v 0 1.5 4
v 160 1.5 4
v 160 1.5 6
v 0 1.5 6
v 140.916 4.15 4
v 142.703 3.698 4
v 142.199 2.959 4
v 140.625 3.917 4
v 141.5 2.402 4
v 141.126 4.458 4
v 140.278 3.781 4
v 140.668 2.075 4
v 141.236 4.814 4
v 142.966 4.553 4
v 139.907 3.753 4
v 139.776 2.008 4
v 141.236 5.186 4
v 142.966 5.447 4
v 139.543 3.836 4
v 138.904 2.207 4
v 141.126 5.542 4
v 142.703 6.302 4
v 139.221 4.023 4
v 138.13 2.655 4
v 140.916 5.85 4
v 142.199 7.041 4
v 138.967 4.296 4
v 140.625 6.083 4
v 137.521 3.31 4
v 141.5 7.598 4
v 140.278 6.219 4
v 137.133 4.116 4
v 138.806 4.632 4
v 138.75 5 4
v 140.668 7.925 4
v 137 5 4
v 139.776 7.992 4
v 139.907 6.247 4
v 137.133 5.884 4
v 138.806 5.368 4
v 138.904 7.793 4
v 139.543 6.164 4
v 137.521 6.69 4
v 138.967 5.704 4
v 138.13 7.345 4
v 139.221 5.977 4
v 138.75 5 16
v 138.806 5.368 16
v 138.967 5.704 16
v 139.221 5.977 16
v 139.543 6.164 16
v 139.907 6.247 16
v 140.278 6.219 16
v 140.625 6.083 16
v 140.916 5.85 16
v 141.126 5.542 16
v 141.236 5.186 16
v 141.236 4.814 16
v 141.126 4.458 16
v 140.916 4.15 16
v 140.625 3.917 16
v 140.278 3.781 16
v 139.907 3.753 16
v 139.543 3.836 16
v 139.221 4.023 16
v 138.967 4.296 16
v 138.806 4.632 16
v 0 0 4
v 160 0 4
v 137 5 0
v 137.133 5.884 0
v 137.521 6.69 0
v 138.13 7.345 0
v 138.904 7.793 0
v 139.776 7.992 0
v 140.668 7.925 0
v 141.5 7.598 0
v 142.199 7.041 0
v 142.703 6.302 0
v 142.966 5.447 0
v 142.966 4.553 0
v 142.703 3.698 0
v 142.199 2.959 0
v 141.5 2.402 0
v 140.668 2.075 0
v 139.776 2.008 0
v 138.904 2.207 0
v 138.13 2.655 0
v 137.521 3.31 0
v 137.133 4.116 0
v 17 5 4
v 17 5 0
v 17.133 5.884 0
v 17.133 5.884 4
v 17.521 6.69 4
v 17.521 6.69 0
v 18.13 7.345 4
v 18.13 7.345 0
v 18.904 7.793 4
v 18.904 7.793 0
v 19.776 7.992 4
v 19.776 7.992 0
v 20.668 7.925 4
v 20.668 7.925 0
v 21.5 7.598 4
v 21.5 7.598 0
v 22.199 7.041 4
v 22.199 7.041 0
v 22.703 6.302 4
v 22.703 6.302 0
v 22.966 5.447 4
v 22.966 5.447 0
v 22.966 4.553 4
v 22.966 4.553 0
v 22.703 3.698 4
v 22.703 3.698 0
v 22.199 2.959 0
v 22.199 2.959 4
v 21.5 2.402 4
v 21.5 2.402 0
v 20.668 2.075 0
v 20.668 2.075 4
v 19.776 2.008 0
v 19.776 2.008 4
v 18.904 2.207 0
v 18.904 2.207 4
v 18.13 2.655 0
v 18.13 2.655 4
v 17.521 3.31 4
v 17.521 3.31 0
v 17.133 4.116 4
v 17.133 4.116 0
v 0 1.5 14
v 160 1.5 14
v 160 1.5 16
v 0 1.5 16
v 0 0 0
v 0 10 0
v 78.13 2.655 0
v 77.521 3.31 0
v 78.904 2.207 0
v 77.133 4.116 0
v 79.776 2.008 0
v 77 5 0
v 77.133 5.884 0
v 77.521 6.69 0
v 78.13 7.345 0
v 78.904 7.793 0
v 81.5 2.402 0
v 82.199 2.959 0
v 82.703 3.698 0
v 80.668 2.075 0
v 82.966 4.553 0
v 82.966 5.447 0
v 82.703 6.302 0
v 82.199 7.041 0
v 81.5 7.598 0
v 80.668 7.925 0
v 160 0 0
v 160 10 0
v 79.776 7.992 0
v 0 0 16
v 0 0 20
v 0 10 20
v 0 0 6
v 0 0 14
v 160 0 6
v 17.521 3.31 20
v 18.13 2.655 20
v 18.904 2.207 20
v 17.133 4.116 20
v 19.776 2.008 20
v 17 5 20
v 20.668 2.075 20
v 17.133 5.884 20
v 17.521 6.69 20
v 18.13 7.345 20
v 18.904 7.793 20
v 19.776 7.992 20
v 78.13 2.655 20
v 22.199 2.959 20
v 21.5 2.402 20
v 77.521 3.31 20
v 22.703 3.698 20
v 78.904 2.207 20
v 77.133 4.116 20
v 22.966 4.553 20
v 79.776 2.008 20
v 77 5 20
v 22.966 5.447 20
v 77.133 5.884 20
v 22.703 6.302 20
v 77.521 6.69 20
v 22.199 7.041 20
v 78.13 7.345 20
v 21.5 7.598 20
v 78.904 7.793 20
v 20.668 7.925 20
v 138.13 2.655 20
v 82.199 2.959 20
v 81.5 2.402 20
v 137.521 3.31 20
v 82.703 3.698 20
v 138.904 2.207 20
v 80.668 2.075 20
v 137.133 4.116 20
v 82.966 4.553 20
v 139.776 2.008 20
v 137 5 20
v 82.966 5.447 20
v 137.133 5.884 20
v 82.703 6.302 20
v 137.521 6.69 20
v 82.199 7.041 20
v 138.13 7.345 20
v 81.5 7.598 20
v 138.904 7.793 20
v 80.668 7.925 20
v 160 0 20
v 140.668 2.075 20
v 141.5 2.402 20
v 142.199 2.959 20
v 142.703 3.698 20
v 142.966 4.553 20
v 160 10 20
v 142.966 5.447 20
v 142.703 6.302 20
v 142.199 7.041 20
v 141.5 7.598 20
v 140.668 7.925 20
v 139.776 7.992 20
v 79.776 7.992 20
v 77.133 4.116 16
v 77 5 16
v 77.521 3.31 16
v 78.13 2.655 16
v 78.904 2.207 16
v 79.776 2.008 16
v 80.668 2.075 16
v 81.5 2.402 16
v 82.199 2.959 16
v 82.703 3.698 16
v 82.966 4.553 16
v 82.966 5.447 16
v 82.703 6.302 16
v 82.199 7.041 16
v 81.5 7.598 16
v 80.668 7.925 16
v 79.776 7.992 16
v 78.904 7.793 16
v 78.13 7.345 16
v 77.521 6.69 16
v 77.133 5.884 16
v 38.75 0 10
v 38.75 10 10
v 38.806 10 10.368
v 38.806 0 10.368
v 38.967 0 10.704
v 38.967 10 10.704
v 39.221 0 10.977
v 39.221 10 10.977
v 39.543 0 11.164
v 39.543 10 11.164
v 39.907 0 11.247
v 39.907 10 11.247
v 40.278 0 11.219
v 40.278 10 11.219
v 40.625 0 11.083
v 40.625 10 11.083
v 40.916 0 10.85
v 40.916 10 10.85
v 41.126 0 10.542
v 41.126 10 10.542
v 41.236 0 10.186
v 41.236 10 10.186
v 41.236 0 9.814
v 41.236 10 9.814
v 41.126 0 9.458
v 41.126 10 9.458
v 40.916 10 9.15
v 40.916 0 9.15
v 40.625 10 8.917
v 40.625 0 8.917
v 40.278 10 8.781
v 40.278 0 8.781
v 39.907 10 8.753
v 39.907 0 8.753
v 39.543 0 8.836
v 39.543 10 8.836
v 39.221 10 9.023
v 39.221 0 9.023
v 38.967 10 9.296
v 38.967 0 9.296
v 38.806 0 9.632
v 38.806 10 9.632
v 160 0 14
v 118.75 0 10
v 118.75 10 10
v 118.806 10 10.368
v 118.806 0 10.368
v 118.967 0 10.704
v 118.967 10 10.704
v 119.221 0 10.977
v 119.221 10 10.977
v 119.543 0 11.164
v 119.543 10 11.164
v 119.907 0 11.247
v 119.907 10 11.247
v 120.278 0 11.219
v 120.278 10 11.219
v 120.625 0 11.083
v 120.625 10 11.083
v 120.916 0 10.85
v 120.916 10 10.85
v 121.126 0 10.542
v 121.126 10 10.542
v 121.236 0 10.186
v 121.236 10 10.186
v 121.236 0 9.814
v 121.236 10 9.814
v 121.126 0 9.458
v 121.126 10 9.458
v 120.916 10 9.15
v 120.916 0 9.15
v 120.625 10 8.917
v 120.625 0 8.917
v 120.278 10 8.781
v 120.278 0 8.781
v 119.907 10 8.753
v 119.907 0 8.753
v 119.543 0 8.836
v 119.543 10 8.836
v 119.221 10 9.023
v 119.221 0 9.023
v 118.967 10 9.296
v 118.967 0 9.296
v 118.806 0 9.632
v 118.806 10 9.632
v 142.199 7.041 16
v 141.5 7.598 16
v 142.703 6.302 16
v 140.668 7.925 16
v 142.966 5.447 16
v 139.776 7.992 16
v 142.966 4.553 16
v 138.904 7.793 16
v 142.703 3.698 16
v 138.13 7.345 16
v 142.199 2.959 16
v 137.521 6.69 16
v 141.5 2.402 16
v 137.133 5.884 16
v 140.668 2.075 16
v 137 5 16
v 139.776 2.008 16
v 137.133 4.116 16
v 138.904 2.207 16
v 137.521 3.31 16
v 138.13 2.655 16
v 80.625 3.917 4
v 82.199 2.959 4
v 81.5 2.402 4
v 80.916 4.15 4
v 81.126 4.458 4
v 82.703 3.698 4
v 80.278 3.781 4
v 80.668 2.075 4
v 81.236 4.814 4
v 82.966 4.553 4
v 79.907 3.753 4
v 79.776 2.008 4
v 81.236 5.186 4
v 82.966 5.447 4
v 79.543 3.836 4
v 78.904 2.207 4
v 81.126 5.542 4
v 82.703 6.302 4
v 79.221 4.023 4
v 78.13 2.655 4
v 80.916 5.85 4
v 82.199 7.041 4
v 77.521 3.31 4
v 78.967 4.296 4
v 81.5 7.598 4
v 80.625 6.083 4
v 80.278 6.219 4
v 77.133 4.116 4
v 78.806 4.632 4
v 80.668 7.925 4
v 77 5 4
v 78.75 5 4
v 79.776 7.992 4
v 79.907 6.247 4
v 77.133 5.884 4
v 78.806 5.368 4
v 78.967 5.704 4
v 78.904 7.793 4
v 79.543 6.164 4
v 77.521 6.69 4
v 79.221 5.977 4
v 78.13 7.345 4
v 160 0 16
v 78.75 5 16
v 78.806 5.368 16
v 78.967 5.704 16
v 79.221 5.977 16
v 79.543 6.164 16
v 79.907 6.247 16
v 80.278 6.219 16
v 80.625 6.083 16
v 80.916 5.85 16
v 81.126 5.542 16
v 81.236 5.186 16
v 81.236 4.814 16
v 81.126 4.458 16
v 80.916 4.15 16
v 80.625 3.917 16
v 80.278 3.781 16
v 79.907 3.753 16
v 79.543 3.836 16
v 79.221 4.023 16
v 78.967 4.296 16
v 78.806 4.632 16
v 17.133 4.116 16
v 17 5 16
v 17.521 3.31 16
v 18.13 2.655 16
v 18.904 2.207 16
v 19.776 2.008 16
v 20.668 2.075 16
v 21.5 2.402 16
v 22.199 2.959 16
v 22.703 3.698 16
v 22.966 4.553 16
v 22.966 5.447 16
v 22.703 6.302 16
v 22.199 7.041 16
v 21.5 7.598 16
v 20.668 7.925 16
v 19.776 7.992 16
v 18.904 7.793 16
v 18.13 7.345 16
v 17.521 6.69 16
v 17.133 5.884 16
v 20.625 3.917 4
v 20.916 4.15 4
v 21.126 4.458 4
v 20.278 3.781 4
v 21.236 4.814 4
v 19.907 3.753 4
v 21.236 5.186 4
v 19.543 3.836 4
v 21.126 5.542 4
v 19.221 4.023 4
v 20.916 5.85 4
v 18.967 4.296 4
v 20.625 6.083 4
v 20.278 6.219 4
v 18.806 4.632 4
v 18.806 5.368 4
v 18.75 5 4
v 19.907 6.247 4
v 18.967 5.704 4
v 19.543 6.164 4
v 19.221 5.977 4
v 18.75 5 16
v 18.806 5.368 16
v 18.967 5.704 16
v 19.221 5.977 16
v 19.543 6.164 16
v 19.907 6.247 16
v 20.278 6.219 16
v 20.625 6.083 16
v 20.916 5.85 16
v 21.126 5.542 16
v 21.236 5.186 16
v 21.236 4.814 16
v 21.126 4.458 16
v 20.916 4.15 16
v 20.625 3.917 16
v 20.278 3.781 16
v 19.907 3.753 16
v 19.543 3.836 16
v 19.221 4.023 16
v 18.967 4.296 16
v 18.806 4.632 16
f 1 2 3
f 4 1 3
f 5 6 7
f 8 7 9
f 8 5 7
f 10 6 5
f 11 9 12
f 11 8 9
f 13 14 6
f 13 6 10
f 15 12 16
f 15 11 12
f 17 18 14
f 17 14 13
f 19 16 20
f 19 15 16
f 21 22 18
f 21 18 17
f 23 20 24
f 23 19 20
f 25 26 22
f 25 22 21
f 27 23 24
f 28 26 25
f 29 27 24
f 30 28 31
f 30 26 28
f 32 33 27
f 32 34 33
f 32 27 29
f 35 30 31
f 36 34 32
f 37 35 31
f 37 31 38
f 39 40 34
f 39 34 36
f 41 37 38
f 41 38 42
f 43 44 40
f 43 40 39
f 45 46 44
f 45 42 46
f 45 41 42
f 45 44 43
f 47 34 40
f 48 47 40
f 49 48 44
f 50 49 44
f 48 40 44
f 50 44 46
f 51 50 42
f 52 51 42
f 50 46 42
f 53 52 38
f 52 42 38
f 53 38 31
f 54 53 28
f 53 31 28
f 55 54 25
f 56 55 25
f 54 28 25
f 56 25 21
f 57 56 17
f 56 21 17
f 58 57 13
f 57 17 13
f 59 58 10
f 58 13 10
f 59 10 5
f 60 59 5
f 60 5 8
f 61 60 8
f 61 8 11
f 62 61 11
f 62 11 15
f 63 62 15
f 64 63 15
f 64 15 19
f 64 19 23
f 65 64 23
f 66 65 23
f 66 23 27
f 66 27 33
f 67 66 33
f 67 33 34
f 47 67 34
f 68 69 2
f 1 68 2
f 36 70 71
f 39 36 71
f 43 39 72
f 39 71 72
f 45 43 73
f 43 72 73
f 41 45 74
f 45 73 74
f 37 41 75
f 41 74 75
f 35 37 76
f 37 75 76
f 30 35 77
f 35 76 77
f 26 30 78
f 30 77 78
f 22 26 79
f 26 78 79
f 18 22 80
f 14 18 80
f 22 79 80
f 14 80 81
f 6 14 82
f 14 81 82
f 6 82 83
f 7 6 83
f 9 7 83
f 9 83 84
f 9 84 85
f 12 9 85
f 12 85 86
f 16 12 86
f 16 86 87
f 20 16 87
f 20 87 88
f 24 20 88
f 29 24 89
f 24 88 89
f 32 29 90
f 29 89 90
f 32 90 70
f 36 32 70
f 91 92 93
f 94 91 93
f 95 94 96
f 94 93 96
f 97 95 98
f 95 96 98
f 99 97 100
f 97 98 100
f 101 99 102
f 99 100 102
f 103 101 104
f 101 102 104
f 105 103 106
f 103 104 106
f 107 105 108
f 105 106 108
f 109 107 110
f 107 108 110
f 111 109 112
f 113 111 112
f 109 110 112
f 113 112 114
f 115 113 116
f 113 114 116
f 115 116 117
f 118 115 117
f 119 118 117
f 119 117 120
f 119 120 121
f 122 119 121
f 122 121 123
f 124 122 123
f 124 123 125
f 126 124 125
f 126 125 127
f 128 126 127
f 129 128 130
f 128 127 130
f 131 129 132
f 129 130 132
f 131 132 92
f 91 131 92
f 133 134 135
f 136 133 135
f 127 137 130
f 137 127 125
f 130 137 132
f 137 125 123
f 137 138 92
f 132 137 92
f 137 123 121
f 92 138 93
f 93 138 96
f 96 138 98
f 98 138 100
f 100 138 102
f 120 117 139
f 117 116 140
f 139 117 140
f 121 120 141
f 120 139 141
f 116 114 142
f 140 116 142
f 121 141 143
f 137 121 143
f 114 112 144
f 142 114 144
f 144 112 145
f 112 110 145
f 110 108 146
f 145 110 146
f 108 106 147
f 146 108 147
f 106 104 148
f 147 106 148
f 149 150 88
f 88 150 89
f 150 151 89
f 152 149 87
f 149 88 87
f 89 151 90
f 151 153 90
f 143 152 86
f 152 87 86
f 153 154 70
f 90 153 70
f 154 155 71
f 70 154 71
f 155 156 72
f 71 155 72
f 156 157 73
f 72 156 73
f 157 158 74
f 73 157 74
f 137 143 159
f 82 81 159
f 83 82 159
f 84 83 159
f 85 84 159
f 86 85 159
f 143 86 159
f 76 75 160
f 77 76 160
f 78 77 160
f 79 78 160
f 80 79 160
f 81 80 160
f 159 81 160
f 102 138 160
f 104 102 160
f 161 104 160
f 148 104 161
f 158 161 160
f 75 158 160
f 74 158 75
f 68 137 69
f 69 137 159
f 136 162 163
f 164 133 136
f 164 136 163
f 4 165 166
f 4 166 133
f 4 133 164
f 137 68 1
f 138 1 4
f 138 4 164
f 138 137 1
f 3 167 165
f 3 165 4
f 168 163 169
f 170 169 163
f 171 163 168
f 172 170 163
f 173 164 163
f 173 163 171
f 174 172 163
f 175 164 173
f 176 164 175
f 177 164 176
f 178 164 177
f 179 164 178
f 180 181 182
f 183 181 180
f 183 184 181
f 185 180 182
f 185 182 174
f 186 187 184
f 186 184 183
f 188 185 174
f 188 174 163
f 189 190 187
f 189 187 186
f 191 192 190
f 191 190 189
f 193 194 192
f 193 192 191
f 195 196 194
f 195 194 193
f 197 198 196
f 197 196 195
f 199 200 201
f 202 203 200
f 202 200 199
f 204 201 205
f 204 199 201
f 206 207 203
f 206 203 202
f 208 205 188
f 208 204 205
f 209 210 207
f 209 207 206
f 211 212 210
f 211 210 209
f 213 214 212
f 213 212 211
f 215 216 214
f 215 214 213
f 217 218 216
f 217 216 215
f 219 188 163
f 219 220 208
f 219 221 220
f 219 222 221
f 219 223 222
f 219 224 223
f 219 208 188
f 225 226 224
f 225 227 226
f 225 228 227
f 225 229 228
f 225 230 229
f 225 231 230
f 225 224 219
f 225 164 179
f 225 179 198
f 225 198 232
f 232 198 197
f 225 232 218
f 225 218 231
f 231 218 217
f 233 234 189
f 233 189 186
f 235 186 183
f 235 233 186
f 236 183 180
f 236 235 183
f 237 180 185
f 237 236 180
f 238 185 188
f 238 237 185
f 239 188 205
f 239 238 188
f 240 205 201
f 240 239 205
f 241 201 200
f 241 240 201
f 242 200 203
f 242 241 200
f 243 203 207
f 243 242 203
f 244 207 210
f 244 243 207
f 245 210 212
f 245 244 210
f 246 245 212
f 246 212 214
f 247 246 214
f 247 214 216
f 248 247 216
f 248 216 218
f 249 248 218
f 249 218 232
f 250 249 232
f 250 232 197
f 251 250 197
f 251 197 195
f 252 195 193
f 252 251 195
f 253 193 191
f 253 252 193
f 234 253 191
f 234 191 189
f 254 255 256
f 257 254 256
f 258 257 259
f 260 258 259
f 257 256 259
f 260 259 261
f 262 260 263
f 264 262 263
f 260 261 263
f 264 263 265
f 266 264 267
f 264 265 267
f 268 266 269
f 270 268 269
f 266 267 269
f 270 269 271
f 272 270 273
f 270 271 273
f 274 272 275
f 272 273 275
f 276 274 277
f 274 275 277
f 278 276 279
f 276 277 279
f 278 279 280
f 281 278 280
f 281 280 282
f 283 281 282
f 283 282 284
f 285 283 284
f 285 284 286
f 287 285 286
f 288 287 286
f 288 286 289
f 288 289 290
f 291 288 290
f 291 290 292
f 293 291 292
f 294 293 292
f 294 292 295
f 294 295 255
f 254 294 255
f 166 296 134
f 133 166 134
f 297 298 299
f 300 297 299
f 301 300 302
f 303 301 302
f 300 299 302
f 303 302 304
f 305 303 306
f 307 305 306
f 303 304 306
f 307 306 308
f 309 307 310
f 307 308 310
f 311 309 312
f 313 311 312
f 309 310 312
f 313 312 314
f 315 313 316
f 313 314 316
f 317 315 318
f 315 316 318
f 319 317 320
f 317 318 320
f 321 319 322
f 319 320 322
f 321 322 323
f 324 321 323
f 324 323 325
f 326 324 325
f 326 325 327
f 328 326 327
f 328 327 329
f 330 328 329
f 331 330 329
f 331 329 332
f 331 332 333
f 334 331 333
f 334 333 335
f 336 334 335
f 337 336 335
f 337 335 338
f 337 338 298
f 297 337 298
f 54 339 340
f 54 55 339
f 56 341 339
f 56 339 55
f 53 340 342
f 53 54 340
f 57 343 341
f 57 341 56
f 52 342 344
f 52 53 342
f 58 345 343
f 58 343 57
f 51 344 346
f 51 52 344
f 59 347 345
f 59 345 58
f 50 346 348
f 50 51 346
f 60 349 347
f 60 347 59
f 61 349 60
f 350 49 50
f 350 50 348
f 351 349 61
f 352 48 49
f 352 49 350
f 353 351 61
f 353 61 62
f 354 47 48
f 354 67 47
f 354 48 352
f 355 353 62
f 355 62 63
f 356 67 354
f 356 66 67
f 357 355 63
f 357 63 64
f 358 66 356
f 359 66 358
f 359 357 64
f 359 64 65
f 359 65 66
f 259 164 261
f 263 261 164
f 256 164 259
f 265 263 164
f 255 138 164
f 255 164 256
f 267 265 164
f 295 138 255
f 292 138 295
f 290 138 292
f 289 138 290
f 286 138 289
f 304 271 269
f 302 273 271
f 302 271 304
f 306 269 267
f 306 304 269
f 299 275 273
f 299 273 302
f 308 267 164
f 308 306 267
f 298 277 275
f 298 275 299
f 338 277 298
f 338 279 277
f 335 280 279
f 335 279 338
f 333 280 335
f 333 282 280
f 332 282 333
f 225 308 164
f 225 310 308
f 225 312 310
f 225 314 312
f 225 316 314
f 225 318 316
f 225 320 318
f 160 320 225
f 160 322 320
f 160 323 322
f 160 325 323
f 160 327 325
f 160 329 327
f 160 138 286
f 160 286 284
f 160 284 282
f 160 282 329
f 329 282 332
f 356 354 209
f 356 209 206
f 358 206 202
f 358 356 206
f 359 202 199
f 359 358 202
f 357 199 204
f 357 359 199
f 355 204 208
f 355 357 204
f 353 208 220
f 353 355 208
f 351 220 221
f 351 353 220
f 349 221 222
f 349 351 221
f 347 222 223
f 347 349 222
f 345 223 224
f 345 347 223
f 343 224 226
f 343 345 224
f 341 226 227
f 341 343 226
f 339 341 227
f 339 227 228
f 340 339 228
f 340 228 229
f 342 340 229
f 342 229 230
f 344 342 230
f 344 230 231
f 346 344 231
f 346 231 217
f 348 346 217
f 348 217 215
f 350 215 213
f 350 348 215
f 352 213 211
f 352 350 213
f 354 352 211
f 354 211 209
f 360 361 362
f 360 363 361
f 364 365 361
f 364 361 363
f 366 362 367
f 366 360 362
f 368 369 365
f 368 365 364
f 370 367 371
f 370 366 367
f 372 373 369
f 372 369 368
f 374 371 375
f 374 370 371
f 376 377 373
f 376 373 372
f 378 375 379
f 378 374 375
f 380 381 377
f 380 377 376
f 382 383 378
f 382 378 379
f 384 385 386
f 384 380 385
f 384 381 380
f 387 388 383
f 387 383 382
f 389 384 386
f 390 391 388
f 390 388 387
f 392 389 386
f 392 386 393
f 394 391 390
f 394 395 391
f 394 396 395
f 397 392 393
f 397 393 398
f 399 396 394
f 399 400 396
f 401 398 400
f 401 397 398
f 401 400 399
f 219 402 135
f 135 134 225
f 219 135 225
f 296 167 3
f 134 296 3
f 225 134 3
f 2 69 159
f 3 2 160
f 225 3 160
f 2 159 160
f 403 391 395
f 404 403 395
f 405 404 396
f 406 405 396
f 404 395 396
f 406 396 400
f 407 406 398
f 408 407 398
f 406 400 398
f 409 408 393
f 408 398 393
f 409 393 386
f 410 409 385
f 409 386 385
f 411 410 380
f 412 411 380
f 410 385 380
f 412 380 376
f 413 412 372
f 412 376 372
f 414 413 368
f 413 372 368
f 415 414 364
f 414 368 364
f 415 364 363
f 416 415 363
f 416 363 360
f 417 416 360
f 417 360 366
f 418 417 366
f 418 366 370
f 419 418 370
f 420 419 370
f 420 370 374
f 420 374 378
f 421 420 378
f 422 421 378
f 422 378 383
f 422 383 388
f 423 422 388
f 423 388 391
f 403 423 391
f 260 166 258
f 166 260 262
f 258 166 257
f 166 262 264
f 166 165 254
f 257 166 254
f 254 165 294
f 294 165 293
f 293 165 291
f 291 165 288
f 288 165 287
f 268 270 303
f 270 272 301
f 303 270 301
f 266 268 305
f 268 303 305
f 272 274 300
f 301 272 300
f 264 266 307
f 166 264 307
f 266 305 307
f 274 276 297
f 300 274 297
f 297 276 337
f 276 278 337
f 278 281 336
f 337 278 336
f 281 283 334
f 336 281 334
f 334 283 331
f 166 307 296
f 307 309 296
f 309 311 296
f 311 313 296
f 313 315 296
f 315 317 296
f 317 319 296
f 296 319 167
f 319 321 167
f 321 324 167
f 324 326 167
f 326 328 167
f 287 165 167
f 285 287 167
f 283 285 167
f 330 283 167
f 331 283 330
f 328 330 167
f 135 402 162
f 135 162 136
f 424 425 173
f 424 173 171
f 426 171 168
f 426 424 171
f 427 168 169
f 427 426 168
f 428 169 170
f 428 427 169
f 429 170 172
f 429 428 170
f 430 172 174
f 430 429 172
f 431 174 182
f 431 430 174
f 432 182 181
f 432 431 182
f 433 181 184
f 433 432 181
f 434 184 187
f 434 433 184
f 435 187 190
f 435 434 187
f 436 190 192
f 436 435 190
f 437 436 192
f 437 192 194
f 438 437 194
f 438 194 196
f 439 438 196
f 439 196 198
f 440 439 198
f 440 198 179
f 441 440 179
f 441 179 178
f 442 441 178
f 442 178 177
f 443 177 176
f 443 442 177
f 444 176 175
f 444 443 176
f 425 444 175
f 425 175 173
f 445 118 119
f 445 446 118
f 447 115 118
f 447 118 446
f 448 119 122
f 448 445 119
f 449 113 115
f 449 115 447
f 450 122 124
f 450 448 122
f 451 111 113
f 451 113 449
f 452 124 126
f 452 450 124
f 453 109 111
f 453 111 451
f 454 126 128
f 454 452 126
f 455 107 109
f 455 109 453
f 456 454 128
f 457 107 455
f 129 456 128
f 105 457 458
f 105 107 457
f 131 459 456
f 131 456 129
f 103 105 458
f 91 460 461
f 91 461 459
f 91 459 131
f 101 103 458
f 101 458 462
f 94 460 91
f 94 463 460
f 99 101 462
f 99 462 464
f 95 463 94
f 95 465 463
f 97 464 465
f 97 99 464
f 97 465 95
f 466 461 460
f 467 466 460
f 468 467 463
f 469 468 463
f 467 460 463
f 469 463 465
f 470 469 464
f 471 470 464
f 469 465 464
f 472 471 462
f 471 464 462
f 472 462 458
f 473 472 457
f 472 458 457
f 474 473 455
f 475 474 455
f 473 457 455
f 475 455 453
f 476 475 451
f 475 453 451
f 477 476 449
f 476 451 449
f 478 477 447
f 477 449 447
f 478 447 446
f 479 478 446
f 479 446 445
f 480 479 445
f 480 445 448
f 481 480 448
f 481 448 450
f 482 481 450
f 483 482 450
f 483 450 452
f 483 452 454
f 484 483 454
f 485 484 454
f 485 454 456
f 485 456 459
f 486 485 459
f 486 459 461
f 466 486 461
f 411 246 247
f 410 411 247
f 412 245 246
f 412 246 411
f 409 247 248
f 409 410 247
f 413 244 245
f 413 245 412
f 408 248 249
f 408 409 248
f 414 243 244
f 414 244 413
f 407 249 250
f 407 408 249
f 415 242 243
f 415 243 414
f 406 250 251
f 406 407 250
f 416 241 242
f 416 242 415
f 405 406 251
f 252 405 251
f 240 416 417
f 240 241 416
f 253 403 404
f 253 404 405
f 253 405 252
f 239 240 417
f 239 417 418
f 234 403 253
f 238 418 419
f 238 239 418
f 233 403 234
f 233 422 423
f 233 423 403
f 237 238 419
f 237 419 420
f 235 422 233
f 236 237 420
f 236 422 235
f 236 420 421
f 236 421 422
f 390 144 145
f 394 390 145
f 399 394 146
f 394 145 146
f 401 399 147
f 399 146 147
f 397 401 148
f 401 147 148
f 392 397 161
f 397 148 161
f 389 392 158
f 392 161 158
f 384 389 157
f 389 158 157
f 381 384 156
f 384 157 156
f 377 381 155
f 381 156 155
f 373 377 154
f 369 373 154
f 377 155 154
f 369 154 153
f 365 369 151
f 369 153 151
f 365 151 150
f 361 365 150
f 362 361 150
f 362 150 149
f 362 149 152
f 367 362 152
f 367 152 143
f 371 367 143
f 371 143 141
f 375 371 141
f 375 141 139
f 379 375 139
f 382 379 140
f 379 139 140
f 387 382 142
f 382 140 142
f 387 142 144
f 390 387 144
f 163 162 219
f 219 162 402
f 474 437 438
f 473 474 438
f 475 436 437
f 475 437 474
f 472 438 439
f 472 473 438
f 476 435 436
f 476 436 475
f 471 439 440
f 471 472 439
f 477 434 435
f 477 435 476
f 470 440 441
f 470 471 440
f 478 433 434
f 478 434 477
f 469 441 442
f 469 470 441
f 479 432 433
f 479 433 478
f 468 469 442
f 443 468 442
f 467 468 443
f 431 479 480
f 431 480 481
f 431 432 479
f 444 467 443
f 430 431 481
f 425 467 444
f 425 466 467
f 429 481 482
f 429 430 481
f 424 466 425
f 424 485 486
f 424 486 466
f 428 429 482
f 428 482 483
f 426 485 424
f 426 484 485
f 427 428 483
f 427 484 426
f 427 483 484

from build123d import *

# Parameters (mm, degrees)
IZIM1_W                     = 160
IZIM1_H                     = 10
Y_KSEKLIK_EKSTR_ZYON1_DEPTH = 20
IZIM6_W                     = 2
IZIM6_H                     = 1.5
KES_EKSTR_ZYON1_DEPTH       = 162.554944214
IZIM4_R                     = 1.25
CUT_EXTRUDE1_DEPTH          = 162.554944214
IZIM7_R                     = 1.25
CUT_EXTRUDE2_DEPTH          = 162.554944214
SKETCH1_R                   = 3
CUT_EXTRUDE3_DEPTH          = 4
CUT_EXTRUDE4_START          = -4
SKETCH2_R                   = 3
CUT_EXTRUDE4_DEPTH          = 4


with BuildPart() as part:
    # Çizim1 → Yükseklik-Ekstrüzyon1 (new body)
    with BuildSketch(Plane.XY):
        with Locations((80, 5)):
            Rectangle(IZIM1_W, IZIM1_H)
    extrude(amount=Y_KSEKLIK_EKSTR_ZYON1_DEPTH)

    # Çizim6 → Kes-Ekstrüzyon1 (cut, through all)
    with BuildSketch(Plane.ZY):
        with Locations((5, 0.75)):
            Rectangle(IZIM6_W, IZIM6_H)
        with Locations((15, 0.75)):
            Rectangle(IZIM6_W, IZIM6_H)
    extrude(amount=-KES_EKSTR_ZYON1_DEPTH, mode=Mode.SUBTRACT)

    # Çizim4 → Cut-Extrude1 (cut, through all)
    with BuildSketch(Plane(origin=(0, 10, 0), x_dir=(1, 0, 0), z_dir=(0, 1, 0))):
        with Locations(Location((40, -10, 0), (0, 0, 180))):
            Circle(IZIM4_R)
        with Locations(Location((120, -10, 0), (0, 0, 180))):
            Circle(IZIM4_R)
    extrude(amount=-CUT_EXTRUDE1_DEPTH, mode=Mode.SUBTRACT)

    # Çizim7 → Cut-Extrude2 (cut, through all)
    with BuildSketch(Plane(origin=(0, 0, 0), x_dir=(-1, 0, 0), z_dir=(0, 0, -1))):
        with Locations((-140, 5)):
            Circle(IZIM7_R)
        with Locations((-80, 5)):
            Circle(IZIM7_R)
        with Locations((-20, 5)):
            Circle(IZIM7_R)
    extrude(amount=-CUT_EXTRUDE2_DEPTH, mode=Mode.SUBTRACT)

    # Sketch1 → Cut-Extrude3 (cut)
    with BuildSketch(Plane(origin=(0, 0, 0), x_dir=(-1, 0, 0), z_dir=(0, 0, -1))):
        with Locations((-140, 5)):
            Circle(SKETCH1_R)
        with Locations((-80, 5)):
            Circle(SKETCH1_R)
        with Locations((-20, 5)):
            Circle(SKETCH1_R)
    extrude(amount=-CUT_EXTRUDE3_DEPTH, mode=Mode.SUBTRACT)

    # Sketch2 → Cut-Extrude4 (cut)
    with BuildSketch(Plane.XY.offset(20).offset(CUT_EXTRUDE4_START)):
        with Locations(Location((20, 5, 0), (0, 0, 180))):
            Circle(SKETCH2_R)
        with Locations(Location((80, 5, 0), (0, 0, 180))):
            Circle(SKETCH2_R)
        with Locations(Location((140, 5, 0), (0, 0, 180))):
            Circle(SKETCH2_R)
    extrude(amount=CUT_EXTRUDE4_DEPTH, mode=Mode.SUBTRACT)


solid = part.part
